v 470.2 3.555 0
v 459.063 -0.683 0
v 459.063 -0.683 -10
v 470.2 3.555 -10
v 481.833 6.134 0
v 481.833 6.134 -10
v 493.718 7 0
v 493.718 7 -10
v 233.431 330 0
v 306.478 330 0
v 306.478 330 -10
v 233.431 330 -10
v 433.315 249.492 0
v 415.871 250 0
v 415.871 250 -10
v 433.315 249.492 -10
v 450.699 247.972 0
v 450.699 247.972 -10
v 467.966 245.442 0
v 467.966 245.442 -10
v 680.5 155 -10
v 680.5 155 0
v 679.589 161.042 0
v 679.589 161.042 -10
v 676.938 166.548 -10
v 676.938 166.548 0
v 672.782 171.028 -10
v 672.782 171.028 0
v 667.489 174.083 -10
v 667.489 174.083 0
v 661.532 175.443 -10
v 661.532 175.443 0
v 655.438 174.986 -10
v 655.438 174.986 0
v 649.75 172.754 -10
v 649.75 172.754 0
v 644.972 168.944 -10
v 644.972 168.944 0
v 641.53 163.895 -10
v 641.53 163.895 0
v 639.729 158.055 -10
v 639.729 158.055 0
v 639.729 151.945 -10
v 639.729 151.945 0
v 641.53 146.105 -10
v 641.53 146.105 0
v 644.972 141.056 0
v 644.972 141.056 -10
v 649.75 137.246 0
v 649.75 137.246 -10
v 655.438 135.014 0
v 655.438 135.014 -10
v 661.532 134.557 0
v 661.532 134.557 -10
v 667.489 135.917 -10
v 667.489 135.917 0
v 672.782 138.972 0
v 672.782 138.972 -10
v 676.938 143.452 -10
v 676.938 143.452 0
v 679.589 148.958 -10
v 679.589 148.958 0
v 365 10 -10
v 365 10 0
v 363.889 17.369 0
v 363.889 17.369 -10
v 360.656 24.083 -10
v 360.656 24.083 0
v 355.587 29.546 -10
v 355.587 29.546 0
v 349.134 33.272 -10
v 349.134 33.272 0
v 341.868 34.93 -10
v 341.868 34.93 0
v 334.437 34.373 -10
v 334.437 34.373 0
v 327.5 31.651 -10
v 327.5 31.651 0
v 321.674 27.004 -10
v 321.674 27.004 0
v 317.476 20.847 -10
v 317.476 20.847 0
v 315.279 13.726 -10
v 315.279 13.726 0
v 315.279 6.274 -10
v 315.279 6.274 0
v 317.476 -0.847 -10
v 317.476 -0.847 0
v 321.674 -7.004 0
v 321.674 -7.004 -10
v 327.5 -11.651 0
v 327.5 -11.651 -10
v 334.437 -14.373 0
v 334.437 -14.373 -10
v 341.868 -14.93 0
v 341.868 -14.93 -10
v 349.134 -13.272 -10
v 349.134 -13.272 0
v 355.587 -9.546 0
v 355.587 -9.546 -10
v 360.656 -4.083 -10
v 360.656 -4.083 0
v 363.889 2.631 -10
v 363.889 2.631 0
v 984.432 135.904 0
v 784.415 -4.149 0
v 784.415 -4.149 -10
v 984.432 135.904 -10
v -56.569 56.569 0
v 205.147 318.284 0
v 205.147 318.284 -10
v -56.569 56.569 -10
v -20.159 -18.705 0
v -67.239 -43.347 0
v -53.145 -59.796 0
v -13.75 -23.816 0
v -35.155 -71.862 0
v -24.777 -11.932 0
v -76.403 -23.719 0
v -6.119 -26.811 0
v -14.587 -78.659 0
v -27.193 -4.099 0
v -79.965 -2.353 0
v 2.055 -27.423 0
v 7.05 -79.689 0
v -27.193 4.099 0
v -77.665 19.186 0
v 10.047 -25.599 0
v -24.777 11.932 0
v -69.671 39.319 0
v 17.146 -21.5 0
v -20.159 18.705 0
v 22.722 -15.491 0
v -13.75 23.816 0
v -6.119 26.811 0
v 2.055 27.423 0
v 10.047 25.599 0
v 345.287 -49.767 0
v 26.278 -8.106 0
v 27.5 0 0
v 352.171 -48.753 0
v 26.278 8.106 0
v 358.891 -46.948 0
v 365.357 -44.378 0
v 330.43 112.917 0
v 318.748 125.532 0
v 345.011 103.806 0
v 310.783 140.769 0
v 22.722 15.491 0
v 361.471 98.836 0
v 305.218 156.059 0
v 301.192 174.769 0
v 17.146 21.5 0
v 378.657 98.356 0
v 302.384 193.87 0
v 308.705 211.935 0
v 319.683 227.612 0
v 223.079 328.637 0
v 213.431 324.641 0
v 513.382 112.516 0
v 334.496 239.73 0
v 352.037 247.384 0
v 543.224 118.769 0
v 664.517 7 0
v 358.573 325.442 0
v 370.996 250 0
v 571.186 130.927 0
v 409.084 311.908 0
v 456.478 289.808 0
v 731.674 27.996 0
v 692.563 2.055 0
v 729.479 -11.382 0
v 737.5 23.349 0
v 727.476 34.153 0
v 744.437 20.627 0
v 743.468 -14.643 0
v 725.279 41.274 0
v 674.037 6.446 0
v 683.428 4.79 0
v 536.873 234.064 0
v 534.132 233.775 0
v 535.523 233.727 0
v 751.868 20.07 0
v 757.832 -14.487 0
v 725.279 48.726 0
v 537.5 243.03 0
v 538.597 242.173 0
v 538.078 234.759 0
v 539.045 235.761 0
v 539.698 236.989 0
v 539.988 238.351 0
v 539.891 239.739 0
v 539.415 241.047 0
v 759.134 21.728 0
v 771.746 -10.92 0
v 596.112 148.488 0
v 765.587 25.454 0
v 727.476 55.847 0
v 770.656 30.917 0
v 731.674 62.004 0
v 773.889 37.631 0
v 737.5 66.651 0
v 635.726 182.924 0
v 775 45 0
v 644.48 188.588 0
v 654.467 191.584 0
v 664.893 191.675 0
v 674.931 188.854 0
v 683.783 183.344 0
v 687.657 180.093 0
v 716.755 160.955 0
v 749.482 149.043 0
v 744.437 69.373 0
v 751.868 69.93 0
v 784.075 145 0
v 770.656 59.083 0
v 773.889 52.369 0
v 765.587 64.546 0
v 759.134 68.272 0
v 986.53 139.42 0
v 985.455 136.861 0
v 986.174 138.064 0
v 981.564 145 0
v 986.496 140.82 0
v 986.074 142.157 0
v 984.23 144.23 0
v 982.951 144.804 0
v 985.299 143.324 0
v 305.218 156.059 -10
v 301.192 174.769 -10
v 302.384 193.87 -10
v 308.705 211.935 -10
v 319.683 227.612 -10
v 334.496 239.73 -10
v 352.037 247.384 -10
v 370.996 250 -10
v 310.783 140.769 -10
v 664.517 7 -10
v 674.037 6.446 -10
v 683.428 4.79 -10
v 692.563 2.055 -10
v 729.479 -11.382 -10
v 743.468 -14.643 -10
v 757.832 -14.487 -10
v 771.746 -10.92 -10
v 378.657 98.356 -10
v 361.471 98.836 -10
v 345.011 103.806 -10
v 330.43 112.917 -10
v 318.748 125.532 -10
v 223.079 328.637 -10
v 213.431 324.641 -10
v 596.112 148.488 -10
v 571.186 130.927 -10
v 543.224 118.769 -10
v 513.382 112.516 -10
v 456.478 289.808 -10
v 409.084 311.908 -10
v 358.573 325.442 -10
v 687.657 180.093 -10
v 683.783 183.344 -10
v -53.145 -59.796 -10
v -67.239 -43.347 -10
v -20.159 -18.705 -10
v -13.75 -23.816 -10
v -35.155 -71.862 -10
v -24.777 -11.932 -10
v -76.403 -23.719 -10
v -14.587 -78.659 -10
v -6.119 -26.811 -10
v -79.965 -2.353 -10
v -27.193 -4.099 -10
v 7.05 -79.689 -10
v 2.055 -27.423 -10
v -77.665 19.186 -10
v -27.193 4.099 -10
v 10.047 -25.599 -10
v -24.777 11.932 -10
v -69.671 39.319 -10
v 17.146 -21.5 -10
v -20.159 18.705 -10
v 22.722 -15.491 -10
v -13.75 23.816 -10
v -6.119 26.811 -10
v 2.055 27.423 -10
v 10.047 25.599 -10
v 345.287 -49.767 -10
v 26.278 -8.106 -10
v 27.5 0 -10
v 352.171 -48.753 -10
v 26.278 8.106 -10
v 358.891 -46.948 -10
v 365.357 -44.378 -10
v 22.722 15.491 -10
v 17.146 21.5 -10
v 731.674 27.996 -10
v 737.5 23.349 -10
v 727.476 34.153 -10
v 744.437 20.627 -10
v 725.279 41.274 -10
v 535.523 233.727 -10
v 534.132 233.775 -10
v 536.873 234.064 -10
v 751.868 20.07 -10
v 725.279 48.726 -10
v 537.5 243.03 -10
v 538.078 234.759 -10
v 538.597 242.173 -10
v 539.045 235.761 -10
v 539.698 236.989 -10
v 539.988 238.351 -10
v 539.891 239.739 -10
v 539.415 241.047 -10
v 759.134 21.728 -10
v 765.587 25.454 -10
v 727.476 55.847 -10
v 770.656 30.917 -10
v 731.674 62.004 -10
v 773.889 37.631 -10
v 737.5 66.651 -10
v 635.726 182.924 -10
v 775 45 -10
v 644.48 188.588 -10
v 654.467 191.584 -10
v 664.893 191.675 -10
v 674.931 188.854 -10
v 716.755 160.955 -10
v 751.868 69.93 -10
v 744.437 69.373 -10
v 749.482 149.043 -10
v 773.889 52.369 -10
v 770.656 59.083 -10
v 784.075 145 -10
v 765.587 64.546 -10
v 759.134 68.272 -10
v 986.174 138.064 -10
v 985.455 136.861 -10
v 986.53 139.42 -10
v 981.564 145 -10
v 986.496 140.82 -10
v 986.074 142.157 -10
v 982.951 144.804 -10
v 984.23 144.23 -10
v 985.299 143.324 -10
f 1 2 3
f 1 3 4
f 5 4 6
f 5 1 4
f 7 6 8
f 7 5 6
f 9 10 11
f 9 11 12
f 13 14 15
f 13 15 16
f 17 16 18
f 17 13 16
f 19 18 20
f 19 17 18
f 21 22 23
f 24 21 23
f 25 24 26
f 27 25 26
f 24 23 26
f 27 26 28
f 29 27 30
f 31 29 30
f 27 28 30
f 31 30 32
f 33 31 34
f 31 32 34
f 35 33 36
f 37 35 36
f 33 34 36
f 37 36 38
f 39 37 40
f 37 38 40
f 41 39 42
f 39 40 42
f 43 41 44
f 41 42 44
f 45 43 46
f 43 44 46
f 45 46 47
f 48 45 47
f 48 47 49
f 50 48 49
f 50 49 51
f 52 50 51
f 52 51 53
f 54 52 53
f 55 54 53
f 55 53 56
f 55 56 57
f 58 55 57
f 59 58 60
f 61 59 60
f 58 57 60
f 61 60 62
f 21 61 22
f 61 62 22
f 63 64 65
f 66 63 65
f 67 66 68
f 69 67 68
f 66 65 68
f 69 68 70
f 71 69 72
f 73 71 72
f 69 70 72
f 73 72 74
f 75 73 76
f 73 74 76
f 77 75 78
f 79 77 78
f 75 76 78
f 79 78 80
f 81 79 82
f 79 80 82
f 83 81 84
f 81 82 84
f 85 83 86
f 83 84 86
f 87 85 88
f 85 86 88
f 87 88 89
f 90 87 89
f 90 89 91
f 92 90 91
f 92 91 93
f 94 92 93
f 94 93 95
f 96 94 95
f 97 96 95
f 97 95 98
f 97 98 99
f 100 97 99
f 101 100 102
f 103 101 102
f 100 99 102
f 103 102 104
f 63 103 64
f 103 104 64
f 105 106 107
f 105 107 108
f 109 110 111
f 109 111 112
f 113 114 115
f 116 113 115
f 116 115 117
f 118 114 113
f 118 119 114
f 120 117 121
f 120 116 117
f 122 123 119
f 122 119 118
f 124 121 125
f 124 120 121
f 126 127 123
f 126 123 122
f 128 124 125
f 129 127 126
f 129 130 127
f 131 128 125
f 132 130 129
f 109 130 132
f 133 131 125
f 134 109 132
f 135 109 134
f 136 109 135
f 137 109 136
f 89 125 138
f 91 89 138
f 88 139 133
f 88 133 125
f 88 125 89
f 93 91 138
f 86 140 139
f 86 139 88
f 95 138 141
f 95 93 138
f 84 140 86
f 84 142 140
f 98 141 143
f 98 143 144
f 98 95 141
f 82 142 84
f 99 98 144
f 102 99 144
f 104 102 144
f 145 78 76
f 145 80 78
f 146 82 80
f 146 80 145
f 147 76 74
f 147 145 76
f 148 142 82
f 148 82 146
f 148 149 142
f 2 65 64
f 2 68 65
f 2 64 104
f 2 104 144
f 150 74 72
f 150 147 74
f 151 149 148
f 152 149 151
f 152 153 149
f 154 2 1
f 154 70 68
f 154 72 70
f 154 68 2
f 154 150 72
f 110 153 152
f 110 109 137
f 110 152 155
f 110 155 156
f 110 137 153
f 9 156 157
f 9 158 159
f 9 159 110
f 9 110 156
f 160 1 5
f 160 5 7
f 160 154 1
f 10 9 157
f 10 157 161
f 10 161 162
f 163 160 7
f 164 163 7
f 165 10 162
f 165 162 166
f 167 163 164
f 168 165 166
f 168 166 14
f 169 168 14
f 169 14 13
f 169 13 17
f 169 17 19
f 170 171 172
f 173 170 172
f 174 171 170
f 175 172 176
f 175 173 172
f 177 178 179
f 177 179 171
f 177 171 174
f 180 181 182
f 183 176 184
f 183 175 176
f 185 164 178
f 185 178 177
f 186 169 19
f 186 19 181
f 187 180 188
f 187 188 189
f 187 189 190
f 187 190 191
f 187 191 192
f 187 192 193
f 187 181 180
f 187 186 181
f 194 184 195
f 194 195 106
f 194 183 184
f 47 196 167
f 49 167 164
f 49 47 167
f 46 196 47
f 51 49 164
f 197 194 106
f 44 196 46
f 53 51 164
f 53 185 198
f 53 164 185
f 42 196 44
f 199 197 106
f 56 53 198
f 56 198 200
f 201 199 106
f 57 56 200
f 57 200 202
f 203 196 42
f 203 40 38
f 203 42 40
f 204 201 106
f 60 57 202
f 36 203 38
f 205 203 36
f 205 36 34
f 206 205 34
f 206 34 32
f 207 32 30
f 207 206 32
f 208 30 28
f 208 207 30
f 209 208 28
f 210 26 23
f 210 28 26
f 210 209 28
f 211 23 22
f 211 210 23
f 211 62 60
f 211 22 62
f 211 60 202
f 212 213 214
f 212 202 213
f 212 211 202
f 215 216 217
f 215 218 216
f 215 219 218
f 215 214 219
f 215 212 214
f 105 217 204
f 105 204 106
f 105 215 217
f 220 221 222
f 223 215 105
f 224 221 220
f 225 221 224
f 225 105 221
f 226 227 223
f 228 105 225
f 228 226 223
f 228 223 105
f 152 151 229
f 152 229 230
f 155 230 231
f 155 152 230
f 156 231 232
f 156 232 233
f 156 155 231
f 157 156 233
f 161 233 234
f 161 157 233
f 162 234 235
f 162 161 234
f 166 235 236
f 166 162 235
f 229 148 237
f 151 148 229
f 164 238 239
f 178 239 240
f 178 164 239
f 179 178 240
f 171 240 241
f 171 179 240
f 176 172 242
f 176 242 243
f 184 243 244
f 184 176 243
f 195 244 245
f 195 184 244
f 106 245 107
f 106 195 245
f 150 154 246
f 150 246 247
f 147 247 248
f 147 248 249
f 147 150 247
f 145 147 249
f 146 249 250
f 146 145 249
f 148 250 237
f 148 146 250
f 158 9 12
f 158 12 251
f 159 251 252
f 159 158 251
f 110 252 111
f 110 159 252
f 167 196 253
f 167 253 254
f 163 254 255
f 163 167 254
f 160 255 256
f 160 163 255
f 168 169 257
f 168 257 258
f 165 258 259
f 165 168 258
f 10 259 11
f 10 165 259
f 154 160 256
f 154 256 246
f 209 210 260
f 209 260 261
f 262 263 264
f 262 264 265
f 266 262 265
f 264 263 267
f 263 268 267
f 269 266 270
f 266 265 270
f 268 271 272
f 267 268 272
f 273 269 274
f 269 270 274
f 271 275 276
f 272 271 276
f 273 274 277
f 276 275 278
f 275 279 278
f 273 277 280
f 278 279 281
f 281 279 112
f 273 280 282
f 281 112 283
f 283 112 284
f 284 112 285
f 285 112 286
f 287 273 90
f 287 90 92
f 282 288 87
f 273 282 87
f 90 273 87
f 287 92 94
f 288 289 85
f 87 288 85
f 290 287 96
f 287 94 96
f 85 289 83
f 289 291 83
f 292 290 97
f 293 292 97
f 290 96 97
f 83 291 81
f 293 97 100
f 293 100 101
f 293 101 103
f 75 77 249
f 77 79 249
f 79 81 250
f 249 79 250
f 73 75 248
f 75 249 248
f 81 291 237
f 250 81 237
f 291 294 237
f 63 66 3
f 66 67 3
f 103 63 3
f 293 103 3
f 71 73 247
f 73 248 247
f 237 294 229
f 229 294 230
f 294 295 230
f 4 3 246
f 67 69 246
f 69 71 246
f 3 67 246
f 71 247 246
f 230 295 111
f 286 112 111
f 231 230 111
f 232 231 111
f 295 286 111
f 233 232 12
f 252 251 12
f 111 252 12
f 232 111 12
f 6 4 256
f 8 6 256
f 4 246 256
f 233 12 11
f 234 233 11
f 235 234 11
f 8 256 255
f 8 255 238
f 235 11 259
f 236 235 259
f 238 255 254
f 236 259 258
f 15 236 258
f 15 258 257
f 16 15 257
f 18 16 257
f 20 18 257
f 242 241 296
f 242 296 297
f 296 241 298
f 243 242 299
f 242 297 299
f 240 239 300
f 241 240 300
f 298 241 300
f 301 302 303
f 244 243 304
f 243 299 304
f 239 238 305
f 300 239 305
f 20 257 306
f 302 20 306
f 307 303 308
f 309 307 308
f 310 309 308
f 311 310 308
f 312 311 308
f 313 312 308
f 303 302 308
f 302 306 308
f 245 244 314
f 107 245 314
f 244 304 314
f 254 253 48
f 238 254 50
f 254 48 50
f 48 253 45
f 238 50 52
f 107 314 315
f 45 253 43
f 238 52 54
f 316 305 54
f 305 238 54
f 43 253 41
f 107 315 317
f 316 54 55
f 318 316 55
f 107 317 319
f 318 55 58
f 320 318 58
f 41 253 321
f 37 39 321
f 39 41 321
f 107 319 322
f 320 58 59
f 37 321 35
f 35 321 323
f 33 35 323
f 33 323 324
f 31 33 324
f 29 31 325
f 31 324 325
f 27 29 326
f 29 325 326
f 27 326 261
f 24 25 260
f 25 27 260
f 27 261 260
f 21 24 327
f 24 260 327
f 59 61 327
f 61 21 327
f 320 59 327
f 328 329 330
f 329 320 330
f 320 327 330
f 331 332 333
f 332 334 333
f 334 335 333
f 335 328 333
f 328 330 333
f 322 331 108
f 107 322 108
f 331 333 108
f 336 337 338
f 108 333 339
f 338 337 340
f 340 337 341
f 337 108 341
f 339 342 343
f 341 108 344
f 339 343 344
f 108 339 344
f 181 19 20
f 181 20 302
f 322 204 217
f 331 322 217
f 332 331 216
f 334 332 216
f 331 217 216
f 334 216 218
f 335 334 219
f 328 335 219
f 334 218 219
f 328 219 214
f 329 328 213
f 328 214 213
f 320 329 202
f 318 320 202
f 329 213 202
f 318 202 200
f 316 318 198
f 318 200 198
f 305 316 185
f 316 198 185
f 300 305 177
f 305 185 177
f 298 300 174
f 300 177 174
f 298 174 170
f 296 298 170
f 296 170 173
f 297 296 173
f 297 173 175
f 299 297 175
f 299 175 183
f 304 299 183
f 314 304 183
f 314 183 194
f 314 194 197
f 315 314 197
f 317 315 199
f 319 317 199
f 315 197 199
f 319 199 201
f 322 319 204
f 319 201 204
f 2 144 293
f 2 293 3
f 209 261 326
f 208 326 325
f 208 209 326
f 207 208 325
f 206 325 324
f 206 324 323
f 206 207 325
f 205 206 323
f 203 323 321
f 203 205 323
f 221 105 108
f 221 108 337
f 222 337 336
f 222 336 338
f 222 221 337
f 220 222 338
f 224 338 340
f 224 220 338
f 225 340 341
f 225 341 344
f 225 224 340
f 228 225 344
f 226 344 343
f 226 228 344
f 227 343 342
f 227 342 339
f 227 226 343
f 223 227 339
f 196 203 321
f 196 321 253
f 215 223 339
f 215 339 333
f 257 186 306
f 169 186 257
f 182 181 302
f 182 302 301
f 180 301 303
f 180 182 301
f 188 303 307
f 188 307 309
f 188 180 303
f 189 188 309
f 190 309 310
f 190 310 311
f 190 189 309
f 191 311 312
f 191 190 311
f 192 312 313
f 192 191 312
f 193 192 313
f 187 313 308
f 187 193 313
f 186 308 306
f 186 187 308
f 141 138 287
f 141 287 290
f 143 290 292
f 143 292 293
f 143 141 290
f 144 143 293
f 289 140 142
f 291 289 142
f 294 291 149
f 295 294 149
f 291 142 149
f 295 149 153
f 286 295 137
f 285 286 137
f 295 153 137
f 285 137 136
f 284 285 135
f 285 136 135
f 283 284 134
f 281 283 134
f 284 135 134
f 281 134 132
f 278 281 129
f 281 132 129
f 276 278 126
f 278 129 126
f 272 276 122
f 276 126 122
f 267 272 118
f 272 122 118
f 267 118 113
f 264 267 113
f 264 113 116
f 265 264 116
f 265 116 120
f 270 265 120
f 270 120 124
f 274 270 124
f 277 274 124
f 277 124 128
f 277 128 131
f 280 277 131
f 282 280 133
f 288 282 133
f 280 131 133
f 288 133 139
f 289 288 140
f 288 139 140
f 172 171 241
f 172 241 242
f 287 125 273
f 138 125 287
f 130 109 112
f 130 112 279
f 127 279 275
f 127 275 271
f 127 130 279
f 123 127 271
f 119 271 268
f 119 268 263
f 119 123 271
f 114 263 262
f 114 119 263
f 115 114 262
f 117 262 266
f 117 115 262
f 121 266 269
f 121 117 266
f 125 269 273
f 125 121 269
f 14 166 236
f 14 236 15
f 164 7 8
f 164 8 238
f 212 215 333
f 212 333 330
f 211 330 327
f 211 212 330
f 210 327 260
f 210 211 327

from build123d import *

# Parameters (mm, degrees)
SKETCH1_R          = 27.5
SKETCH1_R_2        = 25
SKETCH1_R_3        = 20.5
BASE_EXTRUDE_DEPTH = 10


with BuildPart() as part:
    # Sketch1 → Base-Extrude (new body)
    with BuildSketch(Plane.XY):
        with BuildLine():
            Line((7.049670091, -79.688783098), (345.287252568, -49.766587323))
            ThreePointArc((345.287252568, -49.766587323), (355.557216326, -47.948019985), (365.357095704, -44.378467222))
            Line((365.357095704, -44.378467222), (459.062839102, -0.682761463))
            ThreePointArc((459.062839102, -0.682761463), (475.969488221, 5.056272584), (493.717536564, 7))
            Line((493.717536564, 7), (664.517065511, 7))
            ThreePointArc((664.517065511, 7), (678.75621608, 5.754235747), (692.562717264, 2.054794904))
            Line((692.562717264, 2.054794904), (729.4787914, -11.381557247))
            ThreePointArc((729.4787914, -11.381557247), (757.831571533, -14.486691682), (784.414586181, -4.149122657))
            Line((784.414586181, -4.149122657), (984.431516581, 135.904239779))
            ThreePointArc((984.431516581, 135.904239779), (986.332219153, 141.503528998), (981.5636344, 145))
            Line((981.5636344, 145), (784.07485266, 145))
            ThreePointArc((784.07485266, 145), (732.771831161, 154.046106882), (687.656711207, 180.093333532))
            Line((687.656711207, 180.093333532), (683.783141558, 183.343644395))
            ThreePointArc((683.783141558, 183.343644395), (659.677118187, 191.998591153), (635.725815927, 182.924254468))
            Line((635.725815927, 182.924254468), (596.111500497, 148.488055437))
            ThreePointArc((596.111500497, 148.488055437), (557.515006487, 124.135481312), (513.381915638, 112.516208165))
            Line((513.381915638, 112.516208165), (378.657265123, 98.356076801))
            ThreePointArc((378.657265123, 98.356076801), (337.418162835, 107.87687375), (310.782894659, 140.768690684))
            Line((310.782894659, 140.768690684), (305.217826435, 156.058589967))
            ThreePointArc((305.217826435, 156.058589967), (313.65566679, 220.150350545), (370.99630989, 250))
            Line((370.99630989, 250), (415.871293046, 250))
            ThreePointArc((415.871293046, 250), (442.01801587, 248.858409428), (467.965746346, 245.442325904))
            Line((467.965746346, 245.442325904), (534.131759112, 233.775472647))
            ThreePointArc((534.131759112, 233.775472647), (539.698463104, 236.989410696), (537.5, 243.029638431))
            Line((537.5, 243.029638431), (456.478157281, 289.807621135))
            ThreePointArc((456.478157281, 289.807621135), (384.123870812, 319.777747887), (306.478157281, 330))
            Line((306.478157281, 330), (233.431457505, 330))
            ThreePointArc((233.431457505, 330), (218.12412021, 326.9551813), (205.147186258, 318.284271247))
            Line((205.147186258, 318.284271247), (-56.568542495, 56.568542495))
            ThreePointArc((-56.568542495, 56.568542495), (-72.488236118, -33.844580431), (7.049670091, -79.688783098))
        make_face()
        Circle(SKETCH1_R, mode=Mode.SUBTRACT)
        with Locations((340, 10)):
            Circle(SKETCH1_R_2, mode=Mode.SUBTRACT)
        with Locations((750, 45)):
            Circle(SKETCH1_R_2, mode=Mode.SUBTRACT)
        with Locations((660, 155)):
            Circle(SKETCH1_R_3, mode=Mode.SUBTRACT)
    extrude(amount=-BASE_EXTRUDE_DEPTH)


solid = part.part
